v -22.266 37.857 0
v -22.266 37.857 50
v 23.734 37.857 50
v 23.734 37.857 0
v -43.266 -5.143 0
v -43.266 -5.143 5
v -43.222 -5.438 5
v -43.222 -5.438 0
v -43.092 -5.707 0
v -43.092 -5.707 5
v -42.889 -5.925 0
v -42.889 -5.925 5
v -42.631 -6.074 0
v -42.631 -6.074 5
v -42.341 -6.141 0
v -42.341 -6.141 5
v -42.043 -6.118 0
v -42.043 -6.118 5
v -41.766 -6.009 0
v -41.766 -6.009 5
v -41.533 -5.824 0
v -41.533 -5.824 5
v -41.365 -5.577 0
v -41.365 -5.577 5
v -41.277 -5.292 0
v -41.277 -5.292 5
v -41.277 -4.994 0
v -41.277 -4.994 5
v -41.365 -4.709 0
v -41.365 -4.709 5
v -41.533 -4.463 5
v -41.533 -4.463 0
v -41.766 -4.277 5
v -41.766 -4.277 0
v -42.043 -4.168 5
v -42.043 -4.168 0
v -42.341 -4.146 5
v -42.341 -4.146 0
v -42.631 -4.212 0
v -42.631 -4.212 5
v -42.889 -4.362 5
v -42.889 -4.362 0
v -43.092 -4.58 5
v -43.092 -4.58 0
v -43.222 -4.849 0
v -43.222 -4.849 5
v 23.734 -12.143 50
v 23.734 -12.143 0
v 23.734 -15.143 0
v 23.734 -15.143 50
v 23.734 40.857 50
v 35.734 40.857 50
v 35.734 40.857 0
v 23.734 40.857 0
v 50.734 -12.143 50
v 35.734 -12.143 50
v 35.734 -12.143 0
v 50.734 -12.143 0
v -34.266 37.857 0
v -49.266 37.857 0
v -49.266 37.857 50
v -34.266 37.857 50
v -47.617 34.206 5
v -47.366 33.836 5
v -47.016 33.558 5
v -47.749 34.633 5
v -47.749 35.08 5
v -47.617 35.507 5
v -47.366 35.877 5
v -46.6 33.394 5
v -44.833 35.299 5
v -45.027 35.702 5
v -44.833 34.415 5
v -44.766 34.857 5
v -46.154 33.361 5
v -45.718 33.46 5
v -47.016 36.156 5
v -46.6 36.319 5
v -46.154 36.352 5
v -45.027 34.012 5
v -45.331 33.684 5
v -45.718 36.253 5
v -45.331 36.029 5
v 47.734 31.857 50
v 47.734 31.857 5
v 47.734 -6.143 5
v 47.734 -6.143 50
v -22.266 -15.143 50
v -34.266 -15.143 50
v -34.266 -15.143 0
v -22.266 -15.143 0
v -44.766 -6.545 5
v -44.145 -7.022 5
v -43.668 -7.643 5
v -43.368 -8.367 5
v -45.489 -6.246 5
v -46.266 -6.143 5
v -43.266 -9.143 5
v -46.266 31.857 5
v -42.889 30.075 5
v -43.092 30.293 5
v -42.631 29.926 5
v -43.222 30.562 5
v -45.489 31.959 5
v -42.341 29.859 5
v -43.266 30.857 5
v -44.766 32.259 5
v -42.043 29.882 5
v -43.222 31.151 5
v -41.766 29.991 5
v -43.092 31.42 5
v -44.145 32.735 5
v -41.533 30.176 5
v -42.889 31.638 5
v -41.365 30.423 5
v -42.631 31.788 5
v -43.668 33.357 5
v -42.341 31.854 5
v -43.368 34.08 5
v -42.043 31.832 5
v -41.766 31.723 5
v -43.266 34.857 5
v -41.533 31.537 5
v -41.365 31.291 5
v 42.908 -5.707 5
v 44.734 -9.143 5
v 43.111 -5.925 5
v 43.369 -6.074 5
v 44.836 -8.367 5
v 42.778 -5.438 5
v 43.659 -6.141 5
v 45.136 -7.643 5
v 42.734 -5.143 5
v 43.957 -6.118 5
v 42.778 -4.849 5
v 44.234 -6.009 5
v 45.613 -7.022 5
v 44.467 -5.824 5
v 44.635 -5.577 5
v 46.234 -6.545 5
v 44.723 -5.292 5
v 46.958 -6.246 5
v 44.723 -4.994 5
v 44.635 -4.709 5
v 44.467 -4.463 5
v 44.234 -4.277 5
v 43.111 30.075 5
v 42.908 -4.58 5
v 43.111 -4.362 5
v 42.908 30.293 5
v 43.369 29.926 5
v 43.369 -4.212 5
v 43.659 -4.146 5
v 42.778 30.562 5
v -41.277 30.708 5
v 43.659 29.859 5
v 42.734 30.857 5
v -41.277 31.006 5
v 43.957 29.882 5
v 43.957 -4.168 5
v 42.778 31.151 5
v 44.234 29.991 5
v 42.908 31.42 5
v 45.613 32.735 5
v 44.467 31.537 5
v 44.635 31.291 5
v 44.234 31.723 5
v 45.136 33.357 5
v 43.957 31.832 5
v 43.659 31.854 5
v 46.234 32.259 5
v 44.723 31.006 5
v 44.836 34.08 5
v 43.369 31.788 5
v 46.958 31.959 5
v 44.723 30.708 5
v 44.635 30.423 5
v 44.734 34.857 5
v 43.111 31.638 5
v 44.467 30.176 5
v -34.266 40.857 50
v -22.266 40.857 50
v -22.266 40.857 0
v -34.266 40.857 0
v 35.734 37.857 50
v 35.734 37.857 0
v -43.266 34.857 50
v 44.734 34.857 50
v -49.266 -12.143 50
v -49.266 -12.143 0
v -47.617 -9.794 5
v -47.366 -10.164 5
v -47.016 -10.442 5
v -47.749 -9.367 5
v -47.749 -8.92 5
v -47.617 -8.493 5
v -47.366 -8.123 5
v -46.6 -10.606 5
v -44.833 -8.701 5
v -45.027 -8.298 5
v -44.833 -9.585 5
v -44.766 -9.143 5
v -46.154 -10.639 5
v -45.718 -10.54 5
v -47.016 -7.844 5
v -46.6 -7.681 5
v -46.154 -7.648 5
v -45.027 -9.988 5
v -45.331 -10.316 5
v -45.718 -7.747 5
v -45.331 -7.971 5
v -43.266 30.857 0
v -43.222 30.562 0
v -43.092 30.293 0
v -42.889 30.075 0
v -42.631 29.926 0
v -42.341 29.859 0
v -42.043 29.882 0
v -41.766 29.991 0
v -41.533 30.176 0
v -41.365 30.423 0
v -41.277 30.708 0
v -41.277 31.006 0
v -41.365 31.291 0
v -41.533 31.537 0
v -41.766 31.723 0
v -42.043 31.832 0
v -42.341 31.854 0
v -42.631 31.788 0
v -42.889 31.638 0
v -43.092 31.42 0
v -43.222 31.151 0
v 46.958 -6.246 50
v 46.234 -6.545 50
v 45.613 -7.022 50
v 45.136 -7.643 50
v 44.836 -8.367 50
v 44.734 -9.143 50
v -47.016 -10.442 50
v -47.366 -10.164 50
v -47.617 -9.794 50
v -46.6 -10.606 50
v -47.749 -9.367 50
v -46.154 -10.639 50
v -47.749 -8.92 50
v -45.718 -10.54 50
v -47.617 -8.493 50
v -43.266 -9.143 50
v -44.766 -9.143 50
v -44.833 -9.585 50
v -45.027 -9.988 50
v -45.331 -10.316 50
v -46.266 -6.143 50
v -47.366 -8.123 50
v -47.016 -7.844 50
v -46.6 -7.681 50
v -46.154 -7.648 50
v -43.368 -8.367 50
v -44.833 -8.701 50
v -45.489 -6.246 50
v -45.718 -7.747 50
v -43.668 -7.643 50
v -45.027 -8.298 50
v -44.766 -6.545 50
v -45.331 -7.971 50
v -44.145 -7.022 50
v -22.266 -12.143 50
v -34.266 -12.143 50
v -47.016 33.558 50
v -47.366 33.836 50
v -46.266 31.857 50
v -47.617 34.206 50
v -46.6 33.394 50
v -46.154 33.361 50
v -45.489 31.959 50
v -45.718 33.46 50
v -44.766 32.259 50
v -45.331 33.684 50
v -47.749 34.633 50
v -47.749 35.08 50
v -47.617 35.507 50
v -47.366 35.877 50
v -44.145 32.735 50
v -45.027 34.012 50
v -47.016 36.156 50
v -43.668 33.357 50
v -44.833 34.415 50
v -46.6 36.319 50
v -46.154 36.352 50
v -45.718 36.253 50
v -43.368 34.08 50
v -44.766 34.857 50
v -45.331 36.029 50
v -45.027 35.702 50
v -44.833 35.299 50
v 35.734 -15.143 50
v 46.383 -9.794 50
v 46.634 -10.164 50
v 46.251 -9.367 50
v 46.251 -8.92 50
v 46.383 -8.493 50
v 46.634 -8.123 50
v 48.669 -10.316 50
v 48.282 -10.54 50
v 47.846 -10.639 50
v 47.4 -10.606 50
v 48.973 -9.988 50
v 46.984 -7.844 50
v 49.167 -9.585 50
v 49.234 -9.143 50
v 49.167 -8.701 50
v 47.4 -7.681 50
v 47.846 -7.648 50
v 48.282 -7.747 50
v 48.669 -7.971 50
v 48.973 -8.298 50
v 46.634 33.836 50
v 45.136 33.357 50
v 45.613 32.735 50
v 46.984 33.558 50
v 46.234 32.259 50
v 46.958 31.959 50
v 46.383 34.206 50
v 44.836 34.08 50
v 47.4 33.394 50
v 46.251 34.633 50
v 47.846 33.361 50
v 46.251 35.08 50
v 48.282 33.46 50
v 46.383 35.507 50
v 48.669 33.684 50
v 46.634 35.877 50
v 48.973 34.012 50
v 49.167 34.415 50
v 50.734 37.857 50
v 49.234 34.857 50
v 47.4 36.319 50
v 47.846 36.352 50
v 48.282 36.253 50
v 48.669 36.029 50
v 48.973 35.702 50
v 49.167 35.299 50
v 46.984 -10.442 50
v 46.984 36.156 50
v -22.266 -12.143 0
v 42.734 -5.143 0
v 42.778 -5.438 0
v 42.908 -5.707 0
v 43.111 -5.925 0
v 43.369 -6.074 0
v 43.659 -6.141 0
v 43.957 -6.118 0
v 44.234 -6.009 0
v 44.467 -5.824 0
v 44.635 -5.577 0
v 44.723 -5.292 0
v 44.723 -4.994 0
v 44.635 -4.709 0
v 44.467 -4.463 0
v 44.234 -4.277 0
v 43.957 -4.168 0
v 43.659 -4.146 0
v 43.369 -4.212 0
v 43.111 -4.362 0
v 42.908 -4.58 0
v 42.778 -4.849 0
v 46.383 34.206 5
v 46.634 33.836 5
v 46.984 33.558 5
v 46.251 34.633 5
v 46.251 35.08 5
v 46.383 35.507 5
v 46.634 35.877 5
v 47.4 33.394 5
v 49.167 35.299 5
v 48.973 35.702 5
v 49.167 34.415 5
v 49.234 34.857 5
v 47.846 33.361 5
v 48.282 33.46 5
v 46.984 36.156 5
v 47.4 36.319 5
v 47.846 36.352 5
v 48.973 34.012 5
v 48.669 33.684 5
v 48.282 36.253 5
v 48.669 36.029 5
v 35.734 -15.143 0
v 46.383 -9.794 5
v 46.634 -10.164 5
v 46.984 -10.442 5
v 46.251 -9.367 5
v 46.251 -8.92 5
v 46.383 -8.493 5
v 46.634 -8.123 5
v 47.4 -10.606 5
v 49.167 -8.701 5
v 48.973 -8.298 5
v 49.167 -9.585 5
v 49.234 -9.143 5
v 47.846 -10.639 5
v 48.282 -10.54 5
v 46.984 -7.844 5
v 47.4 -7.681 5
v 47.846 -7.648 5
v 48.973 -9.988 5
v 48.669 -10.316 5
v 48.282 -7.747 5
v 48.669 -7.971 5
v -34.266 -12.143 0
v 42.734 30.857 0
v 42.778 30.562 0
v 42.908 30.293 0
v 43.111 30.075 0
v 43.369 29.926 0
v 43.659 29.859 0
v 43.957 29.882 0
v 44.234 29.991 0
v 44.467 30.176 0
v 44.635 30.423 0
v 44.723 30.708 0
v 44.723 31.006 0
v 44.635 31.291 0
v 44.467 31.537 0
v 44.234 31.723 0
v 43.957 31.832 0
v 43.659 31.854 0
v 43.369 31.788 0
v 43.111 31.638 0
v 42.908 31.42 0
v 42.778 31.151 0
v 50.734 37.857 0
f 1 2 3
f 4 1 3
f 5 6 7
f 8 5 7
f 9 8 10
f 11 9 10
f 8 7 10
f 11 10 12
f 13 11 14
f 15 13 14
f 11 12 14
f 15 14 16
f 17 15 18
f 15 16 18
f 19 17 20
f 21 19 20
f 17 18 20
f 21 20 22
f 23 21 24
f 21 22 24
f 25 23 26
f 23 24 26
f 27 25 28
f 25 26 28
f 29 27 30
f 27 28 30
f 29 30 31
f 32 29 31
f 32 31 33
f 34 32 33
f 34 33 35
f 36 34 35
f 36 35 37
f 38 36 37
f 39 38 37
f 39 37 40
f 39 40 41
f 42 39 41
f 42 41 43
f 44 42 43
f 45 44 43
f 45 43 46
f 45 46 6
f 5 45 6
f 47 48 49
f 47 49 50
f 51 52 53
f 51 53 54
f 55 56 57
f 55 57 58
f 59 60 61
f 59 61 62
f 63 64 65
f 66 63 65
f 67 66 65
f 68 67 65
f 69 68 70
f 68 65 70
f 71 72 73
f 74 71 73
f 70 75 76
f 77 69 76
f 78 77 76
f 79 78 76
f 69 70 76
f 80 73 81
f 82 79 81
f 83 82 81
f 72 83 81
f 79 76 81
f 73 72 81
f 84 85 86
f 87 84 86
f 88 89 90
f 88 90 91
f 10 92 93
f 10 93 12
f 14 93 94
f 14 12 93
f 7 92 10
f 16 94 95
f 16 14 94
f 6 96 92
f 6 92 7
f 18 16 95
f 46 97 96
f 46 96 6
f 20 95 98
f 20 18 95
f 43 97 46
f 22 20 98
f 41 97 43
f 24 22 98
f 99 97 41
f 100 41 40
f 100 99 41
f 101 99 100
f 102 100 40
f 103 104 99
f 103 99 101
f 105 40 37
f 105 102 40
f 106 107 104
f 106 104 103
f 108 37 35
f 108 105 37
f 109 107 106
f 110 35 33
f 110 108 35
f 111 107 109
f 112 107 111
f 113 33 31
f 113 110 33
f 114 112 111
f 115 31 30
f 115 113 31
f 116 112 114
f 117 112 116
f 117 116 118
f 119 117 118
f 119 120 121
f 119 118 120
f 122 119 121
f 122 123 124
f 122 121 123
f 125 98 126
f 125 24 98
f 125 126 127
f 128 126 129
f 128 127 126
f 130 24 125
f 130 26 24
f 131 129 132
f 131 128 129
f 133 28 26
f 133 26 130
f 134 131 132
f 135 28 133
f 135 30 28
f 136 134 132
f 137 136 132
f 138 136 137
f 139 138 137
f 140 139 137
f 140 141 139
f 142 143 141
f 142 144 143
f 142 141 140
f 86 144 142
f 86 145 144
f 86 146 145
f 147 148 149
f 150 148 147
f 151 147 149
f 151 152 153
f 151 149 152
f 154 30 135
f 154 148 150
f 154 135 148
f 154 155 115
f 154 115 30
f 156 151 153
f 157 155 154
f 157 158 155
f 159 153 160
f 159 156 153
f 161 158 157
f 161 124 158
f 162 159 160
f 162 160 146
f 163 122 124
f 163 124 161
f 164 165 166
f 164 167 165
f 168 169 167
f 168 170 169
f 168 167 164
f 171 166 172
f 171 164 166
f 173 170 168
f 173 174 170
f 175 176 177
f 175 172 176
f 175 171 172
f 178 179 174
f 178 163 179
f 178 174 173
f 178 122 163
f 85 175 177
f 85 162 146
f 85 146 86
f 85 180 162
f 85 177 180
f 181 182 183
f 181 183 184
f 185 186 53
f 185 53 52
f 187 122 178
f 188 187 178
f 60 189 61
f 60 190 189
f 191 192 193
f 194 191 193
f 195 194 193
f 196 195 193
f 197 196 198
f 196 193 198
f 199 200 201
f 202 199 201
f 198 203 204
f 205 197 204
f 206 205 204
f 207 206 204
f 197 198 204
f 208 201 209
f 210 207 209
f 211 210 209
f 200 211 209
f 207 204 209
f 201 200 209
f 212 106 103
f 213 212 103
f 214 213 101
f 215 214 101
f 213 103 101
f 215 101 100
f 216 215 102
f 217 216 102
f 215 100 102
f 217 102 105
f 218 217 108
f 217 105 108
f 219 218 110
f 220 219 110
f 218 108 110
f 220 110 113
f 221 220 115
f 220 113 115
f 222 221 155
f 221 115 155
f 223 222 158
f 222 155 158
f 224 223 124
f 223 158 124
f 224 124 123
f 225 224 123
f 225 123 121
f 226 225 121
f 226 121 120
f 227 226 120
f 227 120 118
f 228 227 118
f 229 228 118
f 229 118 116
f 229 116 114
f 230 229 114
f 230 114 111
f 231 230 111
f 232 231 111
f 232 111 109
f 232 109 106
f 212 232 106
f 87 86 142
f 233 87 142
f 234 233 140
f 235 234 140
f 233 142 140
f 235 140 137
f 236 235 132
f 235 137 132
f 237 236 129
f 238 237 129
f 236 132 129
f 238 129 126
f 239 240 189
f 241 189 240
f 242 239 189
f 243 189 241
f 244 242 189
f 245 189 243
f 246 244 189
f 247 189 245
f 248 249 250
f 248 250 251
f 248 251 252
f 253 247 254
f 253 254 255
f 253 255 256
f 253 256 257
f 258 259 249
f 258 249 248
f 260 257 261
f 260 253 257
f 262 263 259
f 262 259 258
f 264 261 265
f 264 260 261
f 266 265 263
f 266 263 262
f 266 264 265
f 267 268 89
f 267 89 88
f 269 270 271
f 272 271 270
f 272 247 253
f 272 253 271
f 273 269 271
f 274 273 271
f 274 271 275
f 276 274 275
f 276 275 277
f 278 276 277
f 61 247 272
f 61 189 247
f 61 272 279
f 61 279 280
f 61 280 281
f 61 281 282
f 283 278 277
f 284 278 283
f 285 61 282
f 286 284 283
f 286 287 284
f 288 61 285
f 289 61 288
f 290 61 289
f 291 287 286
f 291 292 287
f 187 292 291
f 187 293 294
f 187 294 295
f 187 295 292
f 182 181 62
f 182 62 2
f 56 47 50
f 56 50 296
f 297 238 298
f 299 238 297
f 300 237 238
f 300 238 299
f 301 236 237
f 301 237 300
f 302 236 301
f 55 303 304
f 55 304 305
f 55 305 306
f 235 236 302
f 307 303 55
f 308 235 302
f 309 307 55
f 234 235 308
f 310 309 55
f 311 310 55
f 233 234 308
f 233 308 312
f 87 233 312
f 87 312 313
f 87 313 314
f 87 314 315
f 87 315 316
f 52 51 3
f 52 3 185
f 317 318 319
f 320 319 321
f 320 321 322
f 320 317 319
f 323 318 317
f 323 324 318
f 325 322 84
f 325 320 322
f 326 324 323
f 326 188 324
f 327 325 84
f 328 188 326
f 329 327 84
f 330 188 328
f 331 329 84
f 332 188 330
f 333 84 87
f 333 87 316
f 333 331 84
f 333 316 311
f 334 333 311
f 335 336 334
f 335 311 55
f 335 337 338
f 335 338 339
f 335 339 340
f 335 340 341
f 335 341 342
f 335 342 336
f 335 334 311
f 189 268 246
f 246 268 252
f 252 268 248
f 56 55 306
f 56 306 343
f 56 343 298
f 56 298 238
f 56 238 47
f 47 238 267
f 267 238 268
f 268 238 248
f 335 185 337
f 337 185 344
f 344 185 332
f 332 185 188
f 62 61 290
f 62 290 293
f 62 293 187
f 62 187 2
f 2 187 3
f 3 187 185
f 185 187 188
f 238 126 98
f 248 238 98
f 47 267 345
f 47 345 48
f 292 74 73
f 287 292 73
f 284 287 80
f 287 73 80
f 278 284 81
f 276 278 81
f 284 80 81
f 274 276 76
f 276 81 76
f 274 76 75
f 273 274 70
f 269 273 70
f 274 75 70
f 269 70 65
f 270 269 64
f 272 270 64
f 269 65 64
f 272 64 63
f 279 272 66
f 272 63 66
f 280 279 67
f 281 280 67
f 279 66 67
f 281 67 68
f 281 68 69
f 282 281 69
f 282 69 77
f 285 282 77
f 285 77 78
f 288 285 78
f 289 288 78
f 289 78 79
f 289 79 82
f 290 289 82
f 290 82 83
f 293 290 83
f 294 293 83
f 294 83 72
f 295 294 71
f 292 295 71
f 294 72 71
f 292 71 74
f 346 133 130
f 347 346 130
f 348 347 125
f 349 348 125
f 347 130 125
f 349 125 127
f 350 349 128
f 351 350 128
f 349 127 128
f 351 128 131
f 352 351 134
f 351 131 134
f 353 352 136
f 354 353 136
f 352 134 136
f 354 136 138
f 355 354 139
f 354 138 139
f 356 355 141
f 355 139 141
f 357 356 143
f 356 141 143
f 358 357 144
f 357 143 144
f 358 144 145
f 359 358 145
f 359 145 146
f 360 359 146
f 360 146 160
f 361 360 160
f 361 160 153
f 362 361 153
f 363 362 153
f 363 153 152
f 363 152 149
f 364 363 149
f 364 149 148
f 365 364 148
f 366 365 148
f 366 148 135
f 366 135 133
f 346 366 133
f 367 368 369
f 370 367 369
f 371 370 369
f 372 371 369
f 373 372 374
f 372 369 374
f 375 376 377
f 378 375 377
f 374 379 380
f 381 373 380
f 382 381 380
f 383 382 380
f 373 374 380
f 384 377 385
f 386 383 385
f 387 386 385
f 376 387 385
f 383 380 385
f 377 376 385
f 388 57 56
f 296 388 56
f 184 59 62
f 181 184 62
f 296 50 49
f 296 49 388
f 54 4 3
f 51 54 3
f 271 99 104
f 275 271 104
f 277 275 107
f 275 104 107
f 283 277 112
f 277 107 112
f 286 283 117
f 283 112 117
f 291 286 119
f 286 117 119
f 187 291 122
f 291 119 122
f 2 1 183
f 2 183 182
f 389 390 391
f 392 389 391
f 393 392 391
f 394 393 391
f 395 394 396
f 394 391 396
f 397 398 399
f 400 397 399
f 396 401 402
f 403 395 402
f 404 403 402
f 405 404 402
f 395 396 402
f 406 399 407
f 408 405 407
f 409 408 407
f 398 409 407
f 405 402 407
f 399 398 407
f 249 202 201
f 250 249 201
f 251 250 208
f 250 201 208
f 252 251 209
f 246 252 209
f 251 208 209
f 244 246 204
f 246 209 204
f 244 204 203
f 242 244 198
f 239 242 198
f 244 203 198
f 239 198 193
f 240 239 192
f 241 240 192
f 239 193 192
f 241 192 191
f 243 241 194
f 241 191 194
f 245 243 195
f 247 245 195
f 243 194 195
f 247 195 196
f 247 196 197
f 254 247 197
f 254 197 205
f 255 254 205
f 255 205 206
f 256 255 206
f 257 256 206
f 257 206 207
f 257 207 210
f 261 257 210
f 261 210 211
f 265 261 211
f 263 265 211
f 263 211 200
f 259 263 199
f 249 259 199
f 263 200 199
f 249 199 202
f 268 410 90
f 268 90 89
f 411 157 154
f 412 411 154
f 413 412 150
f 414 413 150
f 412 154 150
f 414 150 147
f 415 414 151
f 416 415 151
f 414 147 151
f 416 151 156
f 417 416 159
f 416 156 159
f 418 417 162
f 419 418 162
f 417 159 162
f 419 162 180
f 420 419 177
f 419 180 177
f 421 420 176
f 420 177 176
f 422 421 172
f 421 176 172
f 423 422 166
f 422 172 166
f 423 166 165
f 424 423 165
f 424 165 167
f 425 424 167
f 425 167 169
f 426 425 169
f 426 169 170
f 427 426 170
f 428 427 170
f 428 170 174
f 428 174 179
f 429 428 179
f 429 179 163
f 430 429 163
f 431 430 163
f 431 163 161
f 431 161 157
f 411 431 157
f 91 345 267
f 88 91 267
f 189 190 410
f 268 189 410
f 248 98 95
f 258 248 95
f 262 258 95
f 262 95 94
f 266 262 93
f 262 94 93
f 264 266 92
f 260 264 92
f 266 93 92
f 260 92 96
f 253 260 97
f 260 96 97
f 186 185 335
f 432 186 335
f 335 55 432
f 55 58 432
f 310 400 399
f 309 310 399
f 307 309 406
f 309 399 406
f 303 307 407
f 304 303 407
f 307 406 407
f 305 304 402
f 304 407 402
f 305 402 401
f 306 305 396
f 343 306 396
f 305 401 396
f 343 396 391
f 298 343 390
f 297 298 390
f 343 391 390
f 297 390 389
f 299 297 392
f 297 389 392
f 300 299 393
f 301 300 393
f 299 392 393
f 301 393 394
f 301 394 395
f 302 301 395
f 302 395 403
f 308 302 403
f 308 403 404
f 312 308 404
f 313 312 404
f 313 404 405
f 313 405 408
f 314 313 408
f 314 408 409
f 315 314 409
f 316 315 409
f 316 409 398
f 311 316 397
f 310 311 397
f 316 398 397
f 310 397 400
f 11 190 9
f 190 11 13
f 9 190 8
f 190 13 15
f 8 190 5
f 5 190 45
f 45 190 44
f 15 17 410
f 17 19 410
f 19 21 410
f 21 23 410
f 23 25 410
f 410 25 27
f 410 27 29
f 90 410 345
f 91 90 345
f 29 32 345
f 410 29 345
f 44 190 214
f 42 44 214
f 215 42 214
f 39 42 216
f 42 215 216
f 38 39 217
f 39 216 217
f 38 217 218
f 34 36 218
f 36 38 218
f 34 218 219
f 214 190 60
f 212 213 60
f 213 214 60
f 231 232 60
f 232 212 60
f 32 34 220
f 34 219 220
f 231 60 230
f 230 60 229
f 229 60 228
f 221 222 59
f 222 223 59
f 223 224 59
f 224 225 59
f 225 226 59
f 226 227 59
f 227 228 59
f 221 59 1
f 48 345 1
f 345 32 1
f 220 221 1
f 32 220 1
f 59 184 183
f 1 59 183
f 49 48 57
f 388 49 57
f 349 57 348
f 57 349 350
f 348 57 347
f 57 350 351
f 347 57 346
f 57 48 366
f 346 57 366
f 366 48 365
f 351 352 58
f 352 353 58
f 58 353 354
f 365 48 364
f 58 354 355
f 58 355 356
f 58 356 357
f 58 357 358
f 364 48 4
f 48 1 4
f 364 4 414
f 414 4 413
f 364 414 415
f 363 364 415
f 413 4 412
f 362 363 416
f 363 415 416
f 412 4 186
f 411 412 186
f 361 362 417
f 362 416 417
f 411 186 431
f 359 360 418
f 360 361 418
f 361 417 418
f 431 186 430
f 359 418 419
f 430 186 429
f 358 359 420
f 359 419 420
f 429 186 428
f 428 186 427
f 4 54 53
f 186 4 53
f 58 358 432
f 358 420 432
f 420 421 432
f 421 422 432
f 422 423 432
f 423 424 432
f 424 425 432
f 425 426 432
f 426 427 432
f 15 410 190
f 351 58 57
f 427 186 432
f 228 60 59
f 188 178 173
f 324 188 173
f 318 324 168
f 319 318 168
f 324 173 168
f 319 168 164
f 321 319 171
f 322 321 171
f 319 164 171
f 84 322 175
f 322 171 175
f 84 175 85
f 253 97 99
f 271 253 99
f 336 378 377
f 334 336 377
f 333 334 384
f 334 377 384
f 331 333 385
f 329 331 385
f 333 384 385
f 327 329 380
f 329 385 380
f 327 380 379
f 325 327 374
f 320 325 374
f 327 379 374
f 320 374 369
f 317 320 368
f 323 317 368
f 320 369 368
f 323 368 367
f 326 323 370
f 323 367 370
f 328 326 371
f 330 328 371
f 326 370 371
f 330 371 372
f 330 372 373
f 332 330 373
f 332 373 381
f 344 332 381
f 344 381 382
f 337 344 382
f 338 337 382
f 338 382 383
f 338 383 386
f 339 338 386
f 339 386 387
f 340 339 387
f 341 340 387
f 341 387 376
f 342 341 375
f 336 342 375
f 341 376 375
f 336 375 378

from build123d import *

# Parameters (mm, degrees)
F0_W      = 100
F0_H      = 50
F1_DEPTH  = 5
F2_W      = 100
F2_H      = 50
F3_DEPTH  = 45
F4_W      = 12
F4_H      = 50
F5_DEPTH  = 3
F6_W      = 12
F6_H      = 50
F7_DEPTH  = 3
F8_D      = 3
F8_DEPTH  = 45
F8_TIP    = 0.9012909285
F11_D     = 2
F11_DEPTH = 20
F11_TIP   = 0.600860619


# Not quite as in the source:
# - a feature names something its author has since deleted; it is built from what else it names
# - the program builds the solid bodies; features that only make, move or delete a surface that nothing else refers to are left out


with BuildPart() as f1:
    # F0 (on Top) → F1 (new body)
    with BuildSketch(Plane.XY):
        with Locations((0.7340639085, 12.856667003)):
            Rectangle(F0_W, F0_H)
    extrude(amount=F1_DEPTH)

    # F2 (on face) → F3 (join)
    with BuildSketch(Plane.XY.offset(5)):
        with Locations((0.7340639085, 12.856667003)):
            Rectangle(F2_W, F2_H)
        with BuildLine():
            Line((-46.2659360915, -6.143332997), (-46.2659360915, 31.856667003))
            ThreePointArc((-46.2659360915, 31.856667003), (-44.144615748, 32.7353466595), (-43.2659360915, 34.856667003))
            Line((-43.2659360915, 34.856667003), (44.7340639085, 34.856667003))
            ThreePointArc((44.7340639085, 34.856667003), (45.6127435649, 32.7353466595), (47.7340639085, 31.856667003))
            Line((47.7340639085, 31.856667003), (47.7340639085, -6.143332997))
            ThreePointArc((47.7340639085, -6.143332997), (45.6127435649, -7.0220126534), (44.7340639085, -9.143332997))
            Line((44.7340639085, -9.143332997), (-43.2659360915, -9.143332997))
            ThreePointArc((-43.2659360915, -9.143332997), (-44.144615748, -7.0220126534), (-46.2659360915, -6.143332997))
        make_face(mode=Mode.SUBTRACT)
    extrude(amount=F3_DEPTH)

    # F4 (on face) → F5 (join)
    with BuildSketch(Plane.XZ.offset(12.143332997)):
        with Locations((-28.2659360915, 25)):
            Rectangle(F4_W, F4_H)
        with Locations((29.7340639085, 25)):
            Rectangle(F4_W, F4_H)
    extrude(amount=F5_DEPTH)

    # F6 (on face) → F7 (join)
    with BuildSketch(Plane(origin=(0, 37.856667003, 0), x_dir=(-1, 0, 0), z_dir=(0, 1, 0))):
        with Locations((-29.7340639085, 25)):
            Rectangle(F6_W, F6_H)
        with Locations((28.2659360915, 25)):
            Rectangle(F6_W, F6_H)
    extrude(amount=F7_DEPTH)

    # F8 (one way)
    with BuildSketch(Plane(origin=(0, 0, 5), x_dir=(1, 0, 0), z_dir=(0, 0, -1))):
        with Locations((-46.2659360915, -34.856667003), (-46.2659360915, 9.143332997), (47.7340639085, -34.856667003), (47.7340639085, 9.143332997)):
            Circle(F8_D / 2)
    extrude(amount=-F8_DEPTH, mode=Mode.SUBTRACT)
    with Locations(Plane(origin=(0, 0, 5), x_dir=(1, 0, 0), z_dir=(0, 0, -1))):
        with Locations((-46.2659360915, -34.856667003), (-46.2659360915, 9.143332997), (47.7340639085, -34.856667003), (47.7340639085, 9.143332997)):
            with Locations((0, 0, -(F8_DEPTH + F8_TIP / 2))):  # 118° drill point
                Cone(0, F8_D / 2, F8_TIP, mode=Mode.SUBTRACT)

    # F11
    with Locations(Plane(origin=(0, 0, 0), x_dir=(1, 0, 0), z_dir=(0, 0, -1))):
        with Locations((-42.2659360915, 5.143332997), (43.7340639085, 5.143332997), (43.7340639085, -30.856667003), (-42.2659360915, -30.856667003)):
            Hole(F11_D / 2, depth=F11_DEPTH)
            with Locations((0, 0, -(F11_DEPTH + F11_TIP / 2))):  # 118° drill point
                Cone(0, F11_D / 2, F11_TIP, mode=Mode.SUBTRACT)


solid = f1.part
